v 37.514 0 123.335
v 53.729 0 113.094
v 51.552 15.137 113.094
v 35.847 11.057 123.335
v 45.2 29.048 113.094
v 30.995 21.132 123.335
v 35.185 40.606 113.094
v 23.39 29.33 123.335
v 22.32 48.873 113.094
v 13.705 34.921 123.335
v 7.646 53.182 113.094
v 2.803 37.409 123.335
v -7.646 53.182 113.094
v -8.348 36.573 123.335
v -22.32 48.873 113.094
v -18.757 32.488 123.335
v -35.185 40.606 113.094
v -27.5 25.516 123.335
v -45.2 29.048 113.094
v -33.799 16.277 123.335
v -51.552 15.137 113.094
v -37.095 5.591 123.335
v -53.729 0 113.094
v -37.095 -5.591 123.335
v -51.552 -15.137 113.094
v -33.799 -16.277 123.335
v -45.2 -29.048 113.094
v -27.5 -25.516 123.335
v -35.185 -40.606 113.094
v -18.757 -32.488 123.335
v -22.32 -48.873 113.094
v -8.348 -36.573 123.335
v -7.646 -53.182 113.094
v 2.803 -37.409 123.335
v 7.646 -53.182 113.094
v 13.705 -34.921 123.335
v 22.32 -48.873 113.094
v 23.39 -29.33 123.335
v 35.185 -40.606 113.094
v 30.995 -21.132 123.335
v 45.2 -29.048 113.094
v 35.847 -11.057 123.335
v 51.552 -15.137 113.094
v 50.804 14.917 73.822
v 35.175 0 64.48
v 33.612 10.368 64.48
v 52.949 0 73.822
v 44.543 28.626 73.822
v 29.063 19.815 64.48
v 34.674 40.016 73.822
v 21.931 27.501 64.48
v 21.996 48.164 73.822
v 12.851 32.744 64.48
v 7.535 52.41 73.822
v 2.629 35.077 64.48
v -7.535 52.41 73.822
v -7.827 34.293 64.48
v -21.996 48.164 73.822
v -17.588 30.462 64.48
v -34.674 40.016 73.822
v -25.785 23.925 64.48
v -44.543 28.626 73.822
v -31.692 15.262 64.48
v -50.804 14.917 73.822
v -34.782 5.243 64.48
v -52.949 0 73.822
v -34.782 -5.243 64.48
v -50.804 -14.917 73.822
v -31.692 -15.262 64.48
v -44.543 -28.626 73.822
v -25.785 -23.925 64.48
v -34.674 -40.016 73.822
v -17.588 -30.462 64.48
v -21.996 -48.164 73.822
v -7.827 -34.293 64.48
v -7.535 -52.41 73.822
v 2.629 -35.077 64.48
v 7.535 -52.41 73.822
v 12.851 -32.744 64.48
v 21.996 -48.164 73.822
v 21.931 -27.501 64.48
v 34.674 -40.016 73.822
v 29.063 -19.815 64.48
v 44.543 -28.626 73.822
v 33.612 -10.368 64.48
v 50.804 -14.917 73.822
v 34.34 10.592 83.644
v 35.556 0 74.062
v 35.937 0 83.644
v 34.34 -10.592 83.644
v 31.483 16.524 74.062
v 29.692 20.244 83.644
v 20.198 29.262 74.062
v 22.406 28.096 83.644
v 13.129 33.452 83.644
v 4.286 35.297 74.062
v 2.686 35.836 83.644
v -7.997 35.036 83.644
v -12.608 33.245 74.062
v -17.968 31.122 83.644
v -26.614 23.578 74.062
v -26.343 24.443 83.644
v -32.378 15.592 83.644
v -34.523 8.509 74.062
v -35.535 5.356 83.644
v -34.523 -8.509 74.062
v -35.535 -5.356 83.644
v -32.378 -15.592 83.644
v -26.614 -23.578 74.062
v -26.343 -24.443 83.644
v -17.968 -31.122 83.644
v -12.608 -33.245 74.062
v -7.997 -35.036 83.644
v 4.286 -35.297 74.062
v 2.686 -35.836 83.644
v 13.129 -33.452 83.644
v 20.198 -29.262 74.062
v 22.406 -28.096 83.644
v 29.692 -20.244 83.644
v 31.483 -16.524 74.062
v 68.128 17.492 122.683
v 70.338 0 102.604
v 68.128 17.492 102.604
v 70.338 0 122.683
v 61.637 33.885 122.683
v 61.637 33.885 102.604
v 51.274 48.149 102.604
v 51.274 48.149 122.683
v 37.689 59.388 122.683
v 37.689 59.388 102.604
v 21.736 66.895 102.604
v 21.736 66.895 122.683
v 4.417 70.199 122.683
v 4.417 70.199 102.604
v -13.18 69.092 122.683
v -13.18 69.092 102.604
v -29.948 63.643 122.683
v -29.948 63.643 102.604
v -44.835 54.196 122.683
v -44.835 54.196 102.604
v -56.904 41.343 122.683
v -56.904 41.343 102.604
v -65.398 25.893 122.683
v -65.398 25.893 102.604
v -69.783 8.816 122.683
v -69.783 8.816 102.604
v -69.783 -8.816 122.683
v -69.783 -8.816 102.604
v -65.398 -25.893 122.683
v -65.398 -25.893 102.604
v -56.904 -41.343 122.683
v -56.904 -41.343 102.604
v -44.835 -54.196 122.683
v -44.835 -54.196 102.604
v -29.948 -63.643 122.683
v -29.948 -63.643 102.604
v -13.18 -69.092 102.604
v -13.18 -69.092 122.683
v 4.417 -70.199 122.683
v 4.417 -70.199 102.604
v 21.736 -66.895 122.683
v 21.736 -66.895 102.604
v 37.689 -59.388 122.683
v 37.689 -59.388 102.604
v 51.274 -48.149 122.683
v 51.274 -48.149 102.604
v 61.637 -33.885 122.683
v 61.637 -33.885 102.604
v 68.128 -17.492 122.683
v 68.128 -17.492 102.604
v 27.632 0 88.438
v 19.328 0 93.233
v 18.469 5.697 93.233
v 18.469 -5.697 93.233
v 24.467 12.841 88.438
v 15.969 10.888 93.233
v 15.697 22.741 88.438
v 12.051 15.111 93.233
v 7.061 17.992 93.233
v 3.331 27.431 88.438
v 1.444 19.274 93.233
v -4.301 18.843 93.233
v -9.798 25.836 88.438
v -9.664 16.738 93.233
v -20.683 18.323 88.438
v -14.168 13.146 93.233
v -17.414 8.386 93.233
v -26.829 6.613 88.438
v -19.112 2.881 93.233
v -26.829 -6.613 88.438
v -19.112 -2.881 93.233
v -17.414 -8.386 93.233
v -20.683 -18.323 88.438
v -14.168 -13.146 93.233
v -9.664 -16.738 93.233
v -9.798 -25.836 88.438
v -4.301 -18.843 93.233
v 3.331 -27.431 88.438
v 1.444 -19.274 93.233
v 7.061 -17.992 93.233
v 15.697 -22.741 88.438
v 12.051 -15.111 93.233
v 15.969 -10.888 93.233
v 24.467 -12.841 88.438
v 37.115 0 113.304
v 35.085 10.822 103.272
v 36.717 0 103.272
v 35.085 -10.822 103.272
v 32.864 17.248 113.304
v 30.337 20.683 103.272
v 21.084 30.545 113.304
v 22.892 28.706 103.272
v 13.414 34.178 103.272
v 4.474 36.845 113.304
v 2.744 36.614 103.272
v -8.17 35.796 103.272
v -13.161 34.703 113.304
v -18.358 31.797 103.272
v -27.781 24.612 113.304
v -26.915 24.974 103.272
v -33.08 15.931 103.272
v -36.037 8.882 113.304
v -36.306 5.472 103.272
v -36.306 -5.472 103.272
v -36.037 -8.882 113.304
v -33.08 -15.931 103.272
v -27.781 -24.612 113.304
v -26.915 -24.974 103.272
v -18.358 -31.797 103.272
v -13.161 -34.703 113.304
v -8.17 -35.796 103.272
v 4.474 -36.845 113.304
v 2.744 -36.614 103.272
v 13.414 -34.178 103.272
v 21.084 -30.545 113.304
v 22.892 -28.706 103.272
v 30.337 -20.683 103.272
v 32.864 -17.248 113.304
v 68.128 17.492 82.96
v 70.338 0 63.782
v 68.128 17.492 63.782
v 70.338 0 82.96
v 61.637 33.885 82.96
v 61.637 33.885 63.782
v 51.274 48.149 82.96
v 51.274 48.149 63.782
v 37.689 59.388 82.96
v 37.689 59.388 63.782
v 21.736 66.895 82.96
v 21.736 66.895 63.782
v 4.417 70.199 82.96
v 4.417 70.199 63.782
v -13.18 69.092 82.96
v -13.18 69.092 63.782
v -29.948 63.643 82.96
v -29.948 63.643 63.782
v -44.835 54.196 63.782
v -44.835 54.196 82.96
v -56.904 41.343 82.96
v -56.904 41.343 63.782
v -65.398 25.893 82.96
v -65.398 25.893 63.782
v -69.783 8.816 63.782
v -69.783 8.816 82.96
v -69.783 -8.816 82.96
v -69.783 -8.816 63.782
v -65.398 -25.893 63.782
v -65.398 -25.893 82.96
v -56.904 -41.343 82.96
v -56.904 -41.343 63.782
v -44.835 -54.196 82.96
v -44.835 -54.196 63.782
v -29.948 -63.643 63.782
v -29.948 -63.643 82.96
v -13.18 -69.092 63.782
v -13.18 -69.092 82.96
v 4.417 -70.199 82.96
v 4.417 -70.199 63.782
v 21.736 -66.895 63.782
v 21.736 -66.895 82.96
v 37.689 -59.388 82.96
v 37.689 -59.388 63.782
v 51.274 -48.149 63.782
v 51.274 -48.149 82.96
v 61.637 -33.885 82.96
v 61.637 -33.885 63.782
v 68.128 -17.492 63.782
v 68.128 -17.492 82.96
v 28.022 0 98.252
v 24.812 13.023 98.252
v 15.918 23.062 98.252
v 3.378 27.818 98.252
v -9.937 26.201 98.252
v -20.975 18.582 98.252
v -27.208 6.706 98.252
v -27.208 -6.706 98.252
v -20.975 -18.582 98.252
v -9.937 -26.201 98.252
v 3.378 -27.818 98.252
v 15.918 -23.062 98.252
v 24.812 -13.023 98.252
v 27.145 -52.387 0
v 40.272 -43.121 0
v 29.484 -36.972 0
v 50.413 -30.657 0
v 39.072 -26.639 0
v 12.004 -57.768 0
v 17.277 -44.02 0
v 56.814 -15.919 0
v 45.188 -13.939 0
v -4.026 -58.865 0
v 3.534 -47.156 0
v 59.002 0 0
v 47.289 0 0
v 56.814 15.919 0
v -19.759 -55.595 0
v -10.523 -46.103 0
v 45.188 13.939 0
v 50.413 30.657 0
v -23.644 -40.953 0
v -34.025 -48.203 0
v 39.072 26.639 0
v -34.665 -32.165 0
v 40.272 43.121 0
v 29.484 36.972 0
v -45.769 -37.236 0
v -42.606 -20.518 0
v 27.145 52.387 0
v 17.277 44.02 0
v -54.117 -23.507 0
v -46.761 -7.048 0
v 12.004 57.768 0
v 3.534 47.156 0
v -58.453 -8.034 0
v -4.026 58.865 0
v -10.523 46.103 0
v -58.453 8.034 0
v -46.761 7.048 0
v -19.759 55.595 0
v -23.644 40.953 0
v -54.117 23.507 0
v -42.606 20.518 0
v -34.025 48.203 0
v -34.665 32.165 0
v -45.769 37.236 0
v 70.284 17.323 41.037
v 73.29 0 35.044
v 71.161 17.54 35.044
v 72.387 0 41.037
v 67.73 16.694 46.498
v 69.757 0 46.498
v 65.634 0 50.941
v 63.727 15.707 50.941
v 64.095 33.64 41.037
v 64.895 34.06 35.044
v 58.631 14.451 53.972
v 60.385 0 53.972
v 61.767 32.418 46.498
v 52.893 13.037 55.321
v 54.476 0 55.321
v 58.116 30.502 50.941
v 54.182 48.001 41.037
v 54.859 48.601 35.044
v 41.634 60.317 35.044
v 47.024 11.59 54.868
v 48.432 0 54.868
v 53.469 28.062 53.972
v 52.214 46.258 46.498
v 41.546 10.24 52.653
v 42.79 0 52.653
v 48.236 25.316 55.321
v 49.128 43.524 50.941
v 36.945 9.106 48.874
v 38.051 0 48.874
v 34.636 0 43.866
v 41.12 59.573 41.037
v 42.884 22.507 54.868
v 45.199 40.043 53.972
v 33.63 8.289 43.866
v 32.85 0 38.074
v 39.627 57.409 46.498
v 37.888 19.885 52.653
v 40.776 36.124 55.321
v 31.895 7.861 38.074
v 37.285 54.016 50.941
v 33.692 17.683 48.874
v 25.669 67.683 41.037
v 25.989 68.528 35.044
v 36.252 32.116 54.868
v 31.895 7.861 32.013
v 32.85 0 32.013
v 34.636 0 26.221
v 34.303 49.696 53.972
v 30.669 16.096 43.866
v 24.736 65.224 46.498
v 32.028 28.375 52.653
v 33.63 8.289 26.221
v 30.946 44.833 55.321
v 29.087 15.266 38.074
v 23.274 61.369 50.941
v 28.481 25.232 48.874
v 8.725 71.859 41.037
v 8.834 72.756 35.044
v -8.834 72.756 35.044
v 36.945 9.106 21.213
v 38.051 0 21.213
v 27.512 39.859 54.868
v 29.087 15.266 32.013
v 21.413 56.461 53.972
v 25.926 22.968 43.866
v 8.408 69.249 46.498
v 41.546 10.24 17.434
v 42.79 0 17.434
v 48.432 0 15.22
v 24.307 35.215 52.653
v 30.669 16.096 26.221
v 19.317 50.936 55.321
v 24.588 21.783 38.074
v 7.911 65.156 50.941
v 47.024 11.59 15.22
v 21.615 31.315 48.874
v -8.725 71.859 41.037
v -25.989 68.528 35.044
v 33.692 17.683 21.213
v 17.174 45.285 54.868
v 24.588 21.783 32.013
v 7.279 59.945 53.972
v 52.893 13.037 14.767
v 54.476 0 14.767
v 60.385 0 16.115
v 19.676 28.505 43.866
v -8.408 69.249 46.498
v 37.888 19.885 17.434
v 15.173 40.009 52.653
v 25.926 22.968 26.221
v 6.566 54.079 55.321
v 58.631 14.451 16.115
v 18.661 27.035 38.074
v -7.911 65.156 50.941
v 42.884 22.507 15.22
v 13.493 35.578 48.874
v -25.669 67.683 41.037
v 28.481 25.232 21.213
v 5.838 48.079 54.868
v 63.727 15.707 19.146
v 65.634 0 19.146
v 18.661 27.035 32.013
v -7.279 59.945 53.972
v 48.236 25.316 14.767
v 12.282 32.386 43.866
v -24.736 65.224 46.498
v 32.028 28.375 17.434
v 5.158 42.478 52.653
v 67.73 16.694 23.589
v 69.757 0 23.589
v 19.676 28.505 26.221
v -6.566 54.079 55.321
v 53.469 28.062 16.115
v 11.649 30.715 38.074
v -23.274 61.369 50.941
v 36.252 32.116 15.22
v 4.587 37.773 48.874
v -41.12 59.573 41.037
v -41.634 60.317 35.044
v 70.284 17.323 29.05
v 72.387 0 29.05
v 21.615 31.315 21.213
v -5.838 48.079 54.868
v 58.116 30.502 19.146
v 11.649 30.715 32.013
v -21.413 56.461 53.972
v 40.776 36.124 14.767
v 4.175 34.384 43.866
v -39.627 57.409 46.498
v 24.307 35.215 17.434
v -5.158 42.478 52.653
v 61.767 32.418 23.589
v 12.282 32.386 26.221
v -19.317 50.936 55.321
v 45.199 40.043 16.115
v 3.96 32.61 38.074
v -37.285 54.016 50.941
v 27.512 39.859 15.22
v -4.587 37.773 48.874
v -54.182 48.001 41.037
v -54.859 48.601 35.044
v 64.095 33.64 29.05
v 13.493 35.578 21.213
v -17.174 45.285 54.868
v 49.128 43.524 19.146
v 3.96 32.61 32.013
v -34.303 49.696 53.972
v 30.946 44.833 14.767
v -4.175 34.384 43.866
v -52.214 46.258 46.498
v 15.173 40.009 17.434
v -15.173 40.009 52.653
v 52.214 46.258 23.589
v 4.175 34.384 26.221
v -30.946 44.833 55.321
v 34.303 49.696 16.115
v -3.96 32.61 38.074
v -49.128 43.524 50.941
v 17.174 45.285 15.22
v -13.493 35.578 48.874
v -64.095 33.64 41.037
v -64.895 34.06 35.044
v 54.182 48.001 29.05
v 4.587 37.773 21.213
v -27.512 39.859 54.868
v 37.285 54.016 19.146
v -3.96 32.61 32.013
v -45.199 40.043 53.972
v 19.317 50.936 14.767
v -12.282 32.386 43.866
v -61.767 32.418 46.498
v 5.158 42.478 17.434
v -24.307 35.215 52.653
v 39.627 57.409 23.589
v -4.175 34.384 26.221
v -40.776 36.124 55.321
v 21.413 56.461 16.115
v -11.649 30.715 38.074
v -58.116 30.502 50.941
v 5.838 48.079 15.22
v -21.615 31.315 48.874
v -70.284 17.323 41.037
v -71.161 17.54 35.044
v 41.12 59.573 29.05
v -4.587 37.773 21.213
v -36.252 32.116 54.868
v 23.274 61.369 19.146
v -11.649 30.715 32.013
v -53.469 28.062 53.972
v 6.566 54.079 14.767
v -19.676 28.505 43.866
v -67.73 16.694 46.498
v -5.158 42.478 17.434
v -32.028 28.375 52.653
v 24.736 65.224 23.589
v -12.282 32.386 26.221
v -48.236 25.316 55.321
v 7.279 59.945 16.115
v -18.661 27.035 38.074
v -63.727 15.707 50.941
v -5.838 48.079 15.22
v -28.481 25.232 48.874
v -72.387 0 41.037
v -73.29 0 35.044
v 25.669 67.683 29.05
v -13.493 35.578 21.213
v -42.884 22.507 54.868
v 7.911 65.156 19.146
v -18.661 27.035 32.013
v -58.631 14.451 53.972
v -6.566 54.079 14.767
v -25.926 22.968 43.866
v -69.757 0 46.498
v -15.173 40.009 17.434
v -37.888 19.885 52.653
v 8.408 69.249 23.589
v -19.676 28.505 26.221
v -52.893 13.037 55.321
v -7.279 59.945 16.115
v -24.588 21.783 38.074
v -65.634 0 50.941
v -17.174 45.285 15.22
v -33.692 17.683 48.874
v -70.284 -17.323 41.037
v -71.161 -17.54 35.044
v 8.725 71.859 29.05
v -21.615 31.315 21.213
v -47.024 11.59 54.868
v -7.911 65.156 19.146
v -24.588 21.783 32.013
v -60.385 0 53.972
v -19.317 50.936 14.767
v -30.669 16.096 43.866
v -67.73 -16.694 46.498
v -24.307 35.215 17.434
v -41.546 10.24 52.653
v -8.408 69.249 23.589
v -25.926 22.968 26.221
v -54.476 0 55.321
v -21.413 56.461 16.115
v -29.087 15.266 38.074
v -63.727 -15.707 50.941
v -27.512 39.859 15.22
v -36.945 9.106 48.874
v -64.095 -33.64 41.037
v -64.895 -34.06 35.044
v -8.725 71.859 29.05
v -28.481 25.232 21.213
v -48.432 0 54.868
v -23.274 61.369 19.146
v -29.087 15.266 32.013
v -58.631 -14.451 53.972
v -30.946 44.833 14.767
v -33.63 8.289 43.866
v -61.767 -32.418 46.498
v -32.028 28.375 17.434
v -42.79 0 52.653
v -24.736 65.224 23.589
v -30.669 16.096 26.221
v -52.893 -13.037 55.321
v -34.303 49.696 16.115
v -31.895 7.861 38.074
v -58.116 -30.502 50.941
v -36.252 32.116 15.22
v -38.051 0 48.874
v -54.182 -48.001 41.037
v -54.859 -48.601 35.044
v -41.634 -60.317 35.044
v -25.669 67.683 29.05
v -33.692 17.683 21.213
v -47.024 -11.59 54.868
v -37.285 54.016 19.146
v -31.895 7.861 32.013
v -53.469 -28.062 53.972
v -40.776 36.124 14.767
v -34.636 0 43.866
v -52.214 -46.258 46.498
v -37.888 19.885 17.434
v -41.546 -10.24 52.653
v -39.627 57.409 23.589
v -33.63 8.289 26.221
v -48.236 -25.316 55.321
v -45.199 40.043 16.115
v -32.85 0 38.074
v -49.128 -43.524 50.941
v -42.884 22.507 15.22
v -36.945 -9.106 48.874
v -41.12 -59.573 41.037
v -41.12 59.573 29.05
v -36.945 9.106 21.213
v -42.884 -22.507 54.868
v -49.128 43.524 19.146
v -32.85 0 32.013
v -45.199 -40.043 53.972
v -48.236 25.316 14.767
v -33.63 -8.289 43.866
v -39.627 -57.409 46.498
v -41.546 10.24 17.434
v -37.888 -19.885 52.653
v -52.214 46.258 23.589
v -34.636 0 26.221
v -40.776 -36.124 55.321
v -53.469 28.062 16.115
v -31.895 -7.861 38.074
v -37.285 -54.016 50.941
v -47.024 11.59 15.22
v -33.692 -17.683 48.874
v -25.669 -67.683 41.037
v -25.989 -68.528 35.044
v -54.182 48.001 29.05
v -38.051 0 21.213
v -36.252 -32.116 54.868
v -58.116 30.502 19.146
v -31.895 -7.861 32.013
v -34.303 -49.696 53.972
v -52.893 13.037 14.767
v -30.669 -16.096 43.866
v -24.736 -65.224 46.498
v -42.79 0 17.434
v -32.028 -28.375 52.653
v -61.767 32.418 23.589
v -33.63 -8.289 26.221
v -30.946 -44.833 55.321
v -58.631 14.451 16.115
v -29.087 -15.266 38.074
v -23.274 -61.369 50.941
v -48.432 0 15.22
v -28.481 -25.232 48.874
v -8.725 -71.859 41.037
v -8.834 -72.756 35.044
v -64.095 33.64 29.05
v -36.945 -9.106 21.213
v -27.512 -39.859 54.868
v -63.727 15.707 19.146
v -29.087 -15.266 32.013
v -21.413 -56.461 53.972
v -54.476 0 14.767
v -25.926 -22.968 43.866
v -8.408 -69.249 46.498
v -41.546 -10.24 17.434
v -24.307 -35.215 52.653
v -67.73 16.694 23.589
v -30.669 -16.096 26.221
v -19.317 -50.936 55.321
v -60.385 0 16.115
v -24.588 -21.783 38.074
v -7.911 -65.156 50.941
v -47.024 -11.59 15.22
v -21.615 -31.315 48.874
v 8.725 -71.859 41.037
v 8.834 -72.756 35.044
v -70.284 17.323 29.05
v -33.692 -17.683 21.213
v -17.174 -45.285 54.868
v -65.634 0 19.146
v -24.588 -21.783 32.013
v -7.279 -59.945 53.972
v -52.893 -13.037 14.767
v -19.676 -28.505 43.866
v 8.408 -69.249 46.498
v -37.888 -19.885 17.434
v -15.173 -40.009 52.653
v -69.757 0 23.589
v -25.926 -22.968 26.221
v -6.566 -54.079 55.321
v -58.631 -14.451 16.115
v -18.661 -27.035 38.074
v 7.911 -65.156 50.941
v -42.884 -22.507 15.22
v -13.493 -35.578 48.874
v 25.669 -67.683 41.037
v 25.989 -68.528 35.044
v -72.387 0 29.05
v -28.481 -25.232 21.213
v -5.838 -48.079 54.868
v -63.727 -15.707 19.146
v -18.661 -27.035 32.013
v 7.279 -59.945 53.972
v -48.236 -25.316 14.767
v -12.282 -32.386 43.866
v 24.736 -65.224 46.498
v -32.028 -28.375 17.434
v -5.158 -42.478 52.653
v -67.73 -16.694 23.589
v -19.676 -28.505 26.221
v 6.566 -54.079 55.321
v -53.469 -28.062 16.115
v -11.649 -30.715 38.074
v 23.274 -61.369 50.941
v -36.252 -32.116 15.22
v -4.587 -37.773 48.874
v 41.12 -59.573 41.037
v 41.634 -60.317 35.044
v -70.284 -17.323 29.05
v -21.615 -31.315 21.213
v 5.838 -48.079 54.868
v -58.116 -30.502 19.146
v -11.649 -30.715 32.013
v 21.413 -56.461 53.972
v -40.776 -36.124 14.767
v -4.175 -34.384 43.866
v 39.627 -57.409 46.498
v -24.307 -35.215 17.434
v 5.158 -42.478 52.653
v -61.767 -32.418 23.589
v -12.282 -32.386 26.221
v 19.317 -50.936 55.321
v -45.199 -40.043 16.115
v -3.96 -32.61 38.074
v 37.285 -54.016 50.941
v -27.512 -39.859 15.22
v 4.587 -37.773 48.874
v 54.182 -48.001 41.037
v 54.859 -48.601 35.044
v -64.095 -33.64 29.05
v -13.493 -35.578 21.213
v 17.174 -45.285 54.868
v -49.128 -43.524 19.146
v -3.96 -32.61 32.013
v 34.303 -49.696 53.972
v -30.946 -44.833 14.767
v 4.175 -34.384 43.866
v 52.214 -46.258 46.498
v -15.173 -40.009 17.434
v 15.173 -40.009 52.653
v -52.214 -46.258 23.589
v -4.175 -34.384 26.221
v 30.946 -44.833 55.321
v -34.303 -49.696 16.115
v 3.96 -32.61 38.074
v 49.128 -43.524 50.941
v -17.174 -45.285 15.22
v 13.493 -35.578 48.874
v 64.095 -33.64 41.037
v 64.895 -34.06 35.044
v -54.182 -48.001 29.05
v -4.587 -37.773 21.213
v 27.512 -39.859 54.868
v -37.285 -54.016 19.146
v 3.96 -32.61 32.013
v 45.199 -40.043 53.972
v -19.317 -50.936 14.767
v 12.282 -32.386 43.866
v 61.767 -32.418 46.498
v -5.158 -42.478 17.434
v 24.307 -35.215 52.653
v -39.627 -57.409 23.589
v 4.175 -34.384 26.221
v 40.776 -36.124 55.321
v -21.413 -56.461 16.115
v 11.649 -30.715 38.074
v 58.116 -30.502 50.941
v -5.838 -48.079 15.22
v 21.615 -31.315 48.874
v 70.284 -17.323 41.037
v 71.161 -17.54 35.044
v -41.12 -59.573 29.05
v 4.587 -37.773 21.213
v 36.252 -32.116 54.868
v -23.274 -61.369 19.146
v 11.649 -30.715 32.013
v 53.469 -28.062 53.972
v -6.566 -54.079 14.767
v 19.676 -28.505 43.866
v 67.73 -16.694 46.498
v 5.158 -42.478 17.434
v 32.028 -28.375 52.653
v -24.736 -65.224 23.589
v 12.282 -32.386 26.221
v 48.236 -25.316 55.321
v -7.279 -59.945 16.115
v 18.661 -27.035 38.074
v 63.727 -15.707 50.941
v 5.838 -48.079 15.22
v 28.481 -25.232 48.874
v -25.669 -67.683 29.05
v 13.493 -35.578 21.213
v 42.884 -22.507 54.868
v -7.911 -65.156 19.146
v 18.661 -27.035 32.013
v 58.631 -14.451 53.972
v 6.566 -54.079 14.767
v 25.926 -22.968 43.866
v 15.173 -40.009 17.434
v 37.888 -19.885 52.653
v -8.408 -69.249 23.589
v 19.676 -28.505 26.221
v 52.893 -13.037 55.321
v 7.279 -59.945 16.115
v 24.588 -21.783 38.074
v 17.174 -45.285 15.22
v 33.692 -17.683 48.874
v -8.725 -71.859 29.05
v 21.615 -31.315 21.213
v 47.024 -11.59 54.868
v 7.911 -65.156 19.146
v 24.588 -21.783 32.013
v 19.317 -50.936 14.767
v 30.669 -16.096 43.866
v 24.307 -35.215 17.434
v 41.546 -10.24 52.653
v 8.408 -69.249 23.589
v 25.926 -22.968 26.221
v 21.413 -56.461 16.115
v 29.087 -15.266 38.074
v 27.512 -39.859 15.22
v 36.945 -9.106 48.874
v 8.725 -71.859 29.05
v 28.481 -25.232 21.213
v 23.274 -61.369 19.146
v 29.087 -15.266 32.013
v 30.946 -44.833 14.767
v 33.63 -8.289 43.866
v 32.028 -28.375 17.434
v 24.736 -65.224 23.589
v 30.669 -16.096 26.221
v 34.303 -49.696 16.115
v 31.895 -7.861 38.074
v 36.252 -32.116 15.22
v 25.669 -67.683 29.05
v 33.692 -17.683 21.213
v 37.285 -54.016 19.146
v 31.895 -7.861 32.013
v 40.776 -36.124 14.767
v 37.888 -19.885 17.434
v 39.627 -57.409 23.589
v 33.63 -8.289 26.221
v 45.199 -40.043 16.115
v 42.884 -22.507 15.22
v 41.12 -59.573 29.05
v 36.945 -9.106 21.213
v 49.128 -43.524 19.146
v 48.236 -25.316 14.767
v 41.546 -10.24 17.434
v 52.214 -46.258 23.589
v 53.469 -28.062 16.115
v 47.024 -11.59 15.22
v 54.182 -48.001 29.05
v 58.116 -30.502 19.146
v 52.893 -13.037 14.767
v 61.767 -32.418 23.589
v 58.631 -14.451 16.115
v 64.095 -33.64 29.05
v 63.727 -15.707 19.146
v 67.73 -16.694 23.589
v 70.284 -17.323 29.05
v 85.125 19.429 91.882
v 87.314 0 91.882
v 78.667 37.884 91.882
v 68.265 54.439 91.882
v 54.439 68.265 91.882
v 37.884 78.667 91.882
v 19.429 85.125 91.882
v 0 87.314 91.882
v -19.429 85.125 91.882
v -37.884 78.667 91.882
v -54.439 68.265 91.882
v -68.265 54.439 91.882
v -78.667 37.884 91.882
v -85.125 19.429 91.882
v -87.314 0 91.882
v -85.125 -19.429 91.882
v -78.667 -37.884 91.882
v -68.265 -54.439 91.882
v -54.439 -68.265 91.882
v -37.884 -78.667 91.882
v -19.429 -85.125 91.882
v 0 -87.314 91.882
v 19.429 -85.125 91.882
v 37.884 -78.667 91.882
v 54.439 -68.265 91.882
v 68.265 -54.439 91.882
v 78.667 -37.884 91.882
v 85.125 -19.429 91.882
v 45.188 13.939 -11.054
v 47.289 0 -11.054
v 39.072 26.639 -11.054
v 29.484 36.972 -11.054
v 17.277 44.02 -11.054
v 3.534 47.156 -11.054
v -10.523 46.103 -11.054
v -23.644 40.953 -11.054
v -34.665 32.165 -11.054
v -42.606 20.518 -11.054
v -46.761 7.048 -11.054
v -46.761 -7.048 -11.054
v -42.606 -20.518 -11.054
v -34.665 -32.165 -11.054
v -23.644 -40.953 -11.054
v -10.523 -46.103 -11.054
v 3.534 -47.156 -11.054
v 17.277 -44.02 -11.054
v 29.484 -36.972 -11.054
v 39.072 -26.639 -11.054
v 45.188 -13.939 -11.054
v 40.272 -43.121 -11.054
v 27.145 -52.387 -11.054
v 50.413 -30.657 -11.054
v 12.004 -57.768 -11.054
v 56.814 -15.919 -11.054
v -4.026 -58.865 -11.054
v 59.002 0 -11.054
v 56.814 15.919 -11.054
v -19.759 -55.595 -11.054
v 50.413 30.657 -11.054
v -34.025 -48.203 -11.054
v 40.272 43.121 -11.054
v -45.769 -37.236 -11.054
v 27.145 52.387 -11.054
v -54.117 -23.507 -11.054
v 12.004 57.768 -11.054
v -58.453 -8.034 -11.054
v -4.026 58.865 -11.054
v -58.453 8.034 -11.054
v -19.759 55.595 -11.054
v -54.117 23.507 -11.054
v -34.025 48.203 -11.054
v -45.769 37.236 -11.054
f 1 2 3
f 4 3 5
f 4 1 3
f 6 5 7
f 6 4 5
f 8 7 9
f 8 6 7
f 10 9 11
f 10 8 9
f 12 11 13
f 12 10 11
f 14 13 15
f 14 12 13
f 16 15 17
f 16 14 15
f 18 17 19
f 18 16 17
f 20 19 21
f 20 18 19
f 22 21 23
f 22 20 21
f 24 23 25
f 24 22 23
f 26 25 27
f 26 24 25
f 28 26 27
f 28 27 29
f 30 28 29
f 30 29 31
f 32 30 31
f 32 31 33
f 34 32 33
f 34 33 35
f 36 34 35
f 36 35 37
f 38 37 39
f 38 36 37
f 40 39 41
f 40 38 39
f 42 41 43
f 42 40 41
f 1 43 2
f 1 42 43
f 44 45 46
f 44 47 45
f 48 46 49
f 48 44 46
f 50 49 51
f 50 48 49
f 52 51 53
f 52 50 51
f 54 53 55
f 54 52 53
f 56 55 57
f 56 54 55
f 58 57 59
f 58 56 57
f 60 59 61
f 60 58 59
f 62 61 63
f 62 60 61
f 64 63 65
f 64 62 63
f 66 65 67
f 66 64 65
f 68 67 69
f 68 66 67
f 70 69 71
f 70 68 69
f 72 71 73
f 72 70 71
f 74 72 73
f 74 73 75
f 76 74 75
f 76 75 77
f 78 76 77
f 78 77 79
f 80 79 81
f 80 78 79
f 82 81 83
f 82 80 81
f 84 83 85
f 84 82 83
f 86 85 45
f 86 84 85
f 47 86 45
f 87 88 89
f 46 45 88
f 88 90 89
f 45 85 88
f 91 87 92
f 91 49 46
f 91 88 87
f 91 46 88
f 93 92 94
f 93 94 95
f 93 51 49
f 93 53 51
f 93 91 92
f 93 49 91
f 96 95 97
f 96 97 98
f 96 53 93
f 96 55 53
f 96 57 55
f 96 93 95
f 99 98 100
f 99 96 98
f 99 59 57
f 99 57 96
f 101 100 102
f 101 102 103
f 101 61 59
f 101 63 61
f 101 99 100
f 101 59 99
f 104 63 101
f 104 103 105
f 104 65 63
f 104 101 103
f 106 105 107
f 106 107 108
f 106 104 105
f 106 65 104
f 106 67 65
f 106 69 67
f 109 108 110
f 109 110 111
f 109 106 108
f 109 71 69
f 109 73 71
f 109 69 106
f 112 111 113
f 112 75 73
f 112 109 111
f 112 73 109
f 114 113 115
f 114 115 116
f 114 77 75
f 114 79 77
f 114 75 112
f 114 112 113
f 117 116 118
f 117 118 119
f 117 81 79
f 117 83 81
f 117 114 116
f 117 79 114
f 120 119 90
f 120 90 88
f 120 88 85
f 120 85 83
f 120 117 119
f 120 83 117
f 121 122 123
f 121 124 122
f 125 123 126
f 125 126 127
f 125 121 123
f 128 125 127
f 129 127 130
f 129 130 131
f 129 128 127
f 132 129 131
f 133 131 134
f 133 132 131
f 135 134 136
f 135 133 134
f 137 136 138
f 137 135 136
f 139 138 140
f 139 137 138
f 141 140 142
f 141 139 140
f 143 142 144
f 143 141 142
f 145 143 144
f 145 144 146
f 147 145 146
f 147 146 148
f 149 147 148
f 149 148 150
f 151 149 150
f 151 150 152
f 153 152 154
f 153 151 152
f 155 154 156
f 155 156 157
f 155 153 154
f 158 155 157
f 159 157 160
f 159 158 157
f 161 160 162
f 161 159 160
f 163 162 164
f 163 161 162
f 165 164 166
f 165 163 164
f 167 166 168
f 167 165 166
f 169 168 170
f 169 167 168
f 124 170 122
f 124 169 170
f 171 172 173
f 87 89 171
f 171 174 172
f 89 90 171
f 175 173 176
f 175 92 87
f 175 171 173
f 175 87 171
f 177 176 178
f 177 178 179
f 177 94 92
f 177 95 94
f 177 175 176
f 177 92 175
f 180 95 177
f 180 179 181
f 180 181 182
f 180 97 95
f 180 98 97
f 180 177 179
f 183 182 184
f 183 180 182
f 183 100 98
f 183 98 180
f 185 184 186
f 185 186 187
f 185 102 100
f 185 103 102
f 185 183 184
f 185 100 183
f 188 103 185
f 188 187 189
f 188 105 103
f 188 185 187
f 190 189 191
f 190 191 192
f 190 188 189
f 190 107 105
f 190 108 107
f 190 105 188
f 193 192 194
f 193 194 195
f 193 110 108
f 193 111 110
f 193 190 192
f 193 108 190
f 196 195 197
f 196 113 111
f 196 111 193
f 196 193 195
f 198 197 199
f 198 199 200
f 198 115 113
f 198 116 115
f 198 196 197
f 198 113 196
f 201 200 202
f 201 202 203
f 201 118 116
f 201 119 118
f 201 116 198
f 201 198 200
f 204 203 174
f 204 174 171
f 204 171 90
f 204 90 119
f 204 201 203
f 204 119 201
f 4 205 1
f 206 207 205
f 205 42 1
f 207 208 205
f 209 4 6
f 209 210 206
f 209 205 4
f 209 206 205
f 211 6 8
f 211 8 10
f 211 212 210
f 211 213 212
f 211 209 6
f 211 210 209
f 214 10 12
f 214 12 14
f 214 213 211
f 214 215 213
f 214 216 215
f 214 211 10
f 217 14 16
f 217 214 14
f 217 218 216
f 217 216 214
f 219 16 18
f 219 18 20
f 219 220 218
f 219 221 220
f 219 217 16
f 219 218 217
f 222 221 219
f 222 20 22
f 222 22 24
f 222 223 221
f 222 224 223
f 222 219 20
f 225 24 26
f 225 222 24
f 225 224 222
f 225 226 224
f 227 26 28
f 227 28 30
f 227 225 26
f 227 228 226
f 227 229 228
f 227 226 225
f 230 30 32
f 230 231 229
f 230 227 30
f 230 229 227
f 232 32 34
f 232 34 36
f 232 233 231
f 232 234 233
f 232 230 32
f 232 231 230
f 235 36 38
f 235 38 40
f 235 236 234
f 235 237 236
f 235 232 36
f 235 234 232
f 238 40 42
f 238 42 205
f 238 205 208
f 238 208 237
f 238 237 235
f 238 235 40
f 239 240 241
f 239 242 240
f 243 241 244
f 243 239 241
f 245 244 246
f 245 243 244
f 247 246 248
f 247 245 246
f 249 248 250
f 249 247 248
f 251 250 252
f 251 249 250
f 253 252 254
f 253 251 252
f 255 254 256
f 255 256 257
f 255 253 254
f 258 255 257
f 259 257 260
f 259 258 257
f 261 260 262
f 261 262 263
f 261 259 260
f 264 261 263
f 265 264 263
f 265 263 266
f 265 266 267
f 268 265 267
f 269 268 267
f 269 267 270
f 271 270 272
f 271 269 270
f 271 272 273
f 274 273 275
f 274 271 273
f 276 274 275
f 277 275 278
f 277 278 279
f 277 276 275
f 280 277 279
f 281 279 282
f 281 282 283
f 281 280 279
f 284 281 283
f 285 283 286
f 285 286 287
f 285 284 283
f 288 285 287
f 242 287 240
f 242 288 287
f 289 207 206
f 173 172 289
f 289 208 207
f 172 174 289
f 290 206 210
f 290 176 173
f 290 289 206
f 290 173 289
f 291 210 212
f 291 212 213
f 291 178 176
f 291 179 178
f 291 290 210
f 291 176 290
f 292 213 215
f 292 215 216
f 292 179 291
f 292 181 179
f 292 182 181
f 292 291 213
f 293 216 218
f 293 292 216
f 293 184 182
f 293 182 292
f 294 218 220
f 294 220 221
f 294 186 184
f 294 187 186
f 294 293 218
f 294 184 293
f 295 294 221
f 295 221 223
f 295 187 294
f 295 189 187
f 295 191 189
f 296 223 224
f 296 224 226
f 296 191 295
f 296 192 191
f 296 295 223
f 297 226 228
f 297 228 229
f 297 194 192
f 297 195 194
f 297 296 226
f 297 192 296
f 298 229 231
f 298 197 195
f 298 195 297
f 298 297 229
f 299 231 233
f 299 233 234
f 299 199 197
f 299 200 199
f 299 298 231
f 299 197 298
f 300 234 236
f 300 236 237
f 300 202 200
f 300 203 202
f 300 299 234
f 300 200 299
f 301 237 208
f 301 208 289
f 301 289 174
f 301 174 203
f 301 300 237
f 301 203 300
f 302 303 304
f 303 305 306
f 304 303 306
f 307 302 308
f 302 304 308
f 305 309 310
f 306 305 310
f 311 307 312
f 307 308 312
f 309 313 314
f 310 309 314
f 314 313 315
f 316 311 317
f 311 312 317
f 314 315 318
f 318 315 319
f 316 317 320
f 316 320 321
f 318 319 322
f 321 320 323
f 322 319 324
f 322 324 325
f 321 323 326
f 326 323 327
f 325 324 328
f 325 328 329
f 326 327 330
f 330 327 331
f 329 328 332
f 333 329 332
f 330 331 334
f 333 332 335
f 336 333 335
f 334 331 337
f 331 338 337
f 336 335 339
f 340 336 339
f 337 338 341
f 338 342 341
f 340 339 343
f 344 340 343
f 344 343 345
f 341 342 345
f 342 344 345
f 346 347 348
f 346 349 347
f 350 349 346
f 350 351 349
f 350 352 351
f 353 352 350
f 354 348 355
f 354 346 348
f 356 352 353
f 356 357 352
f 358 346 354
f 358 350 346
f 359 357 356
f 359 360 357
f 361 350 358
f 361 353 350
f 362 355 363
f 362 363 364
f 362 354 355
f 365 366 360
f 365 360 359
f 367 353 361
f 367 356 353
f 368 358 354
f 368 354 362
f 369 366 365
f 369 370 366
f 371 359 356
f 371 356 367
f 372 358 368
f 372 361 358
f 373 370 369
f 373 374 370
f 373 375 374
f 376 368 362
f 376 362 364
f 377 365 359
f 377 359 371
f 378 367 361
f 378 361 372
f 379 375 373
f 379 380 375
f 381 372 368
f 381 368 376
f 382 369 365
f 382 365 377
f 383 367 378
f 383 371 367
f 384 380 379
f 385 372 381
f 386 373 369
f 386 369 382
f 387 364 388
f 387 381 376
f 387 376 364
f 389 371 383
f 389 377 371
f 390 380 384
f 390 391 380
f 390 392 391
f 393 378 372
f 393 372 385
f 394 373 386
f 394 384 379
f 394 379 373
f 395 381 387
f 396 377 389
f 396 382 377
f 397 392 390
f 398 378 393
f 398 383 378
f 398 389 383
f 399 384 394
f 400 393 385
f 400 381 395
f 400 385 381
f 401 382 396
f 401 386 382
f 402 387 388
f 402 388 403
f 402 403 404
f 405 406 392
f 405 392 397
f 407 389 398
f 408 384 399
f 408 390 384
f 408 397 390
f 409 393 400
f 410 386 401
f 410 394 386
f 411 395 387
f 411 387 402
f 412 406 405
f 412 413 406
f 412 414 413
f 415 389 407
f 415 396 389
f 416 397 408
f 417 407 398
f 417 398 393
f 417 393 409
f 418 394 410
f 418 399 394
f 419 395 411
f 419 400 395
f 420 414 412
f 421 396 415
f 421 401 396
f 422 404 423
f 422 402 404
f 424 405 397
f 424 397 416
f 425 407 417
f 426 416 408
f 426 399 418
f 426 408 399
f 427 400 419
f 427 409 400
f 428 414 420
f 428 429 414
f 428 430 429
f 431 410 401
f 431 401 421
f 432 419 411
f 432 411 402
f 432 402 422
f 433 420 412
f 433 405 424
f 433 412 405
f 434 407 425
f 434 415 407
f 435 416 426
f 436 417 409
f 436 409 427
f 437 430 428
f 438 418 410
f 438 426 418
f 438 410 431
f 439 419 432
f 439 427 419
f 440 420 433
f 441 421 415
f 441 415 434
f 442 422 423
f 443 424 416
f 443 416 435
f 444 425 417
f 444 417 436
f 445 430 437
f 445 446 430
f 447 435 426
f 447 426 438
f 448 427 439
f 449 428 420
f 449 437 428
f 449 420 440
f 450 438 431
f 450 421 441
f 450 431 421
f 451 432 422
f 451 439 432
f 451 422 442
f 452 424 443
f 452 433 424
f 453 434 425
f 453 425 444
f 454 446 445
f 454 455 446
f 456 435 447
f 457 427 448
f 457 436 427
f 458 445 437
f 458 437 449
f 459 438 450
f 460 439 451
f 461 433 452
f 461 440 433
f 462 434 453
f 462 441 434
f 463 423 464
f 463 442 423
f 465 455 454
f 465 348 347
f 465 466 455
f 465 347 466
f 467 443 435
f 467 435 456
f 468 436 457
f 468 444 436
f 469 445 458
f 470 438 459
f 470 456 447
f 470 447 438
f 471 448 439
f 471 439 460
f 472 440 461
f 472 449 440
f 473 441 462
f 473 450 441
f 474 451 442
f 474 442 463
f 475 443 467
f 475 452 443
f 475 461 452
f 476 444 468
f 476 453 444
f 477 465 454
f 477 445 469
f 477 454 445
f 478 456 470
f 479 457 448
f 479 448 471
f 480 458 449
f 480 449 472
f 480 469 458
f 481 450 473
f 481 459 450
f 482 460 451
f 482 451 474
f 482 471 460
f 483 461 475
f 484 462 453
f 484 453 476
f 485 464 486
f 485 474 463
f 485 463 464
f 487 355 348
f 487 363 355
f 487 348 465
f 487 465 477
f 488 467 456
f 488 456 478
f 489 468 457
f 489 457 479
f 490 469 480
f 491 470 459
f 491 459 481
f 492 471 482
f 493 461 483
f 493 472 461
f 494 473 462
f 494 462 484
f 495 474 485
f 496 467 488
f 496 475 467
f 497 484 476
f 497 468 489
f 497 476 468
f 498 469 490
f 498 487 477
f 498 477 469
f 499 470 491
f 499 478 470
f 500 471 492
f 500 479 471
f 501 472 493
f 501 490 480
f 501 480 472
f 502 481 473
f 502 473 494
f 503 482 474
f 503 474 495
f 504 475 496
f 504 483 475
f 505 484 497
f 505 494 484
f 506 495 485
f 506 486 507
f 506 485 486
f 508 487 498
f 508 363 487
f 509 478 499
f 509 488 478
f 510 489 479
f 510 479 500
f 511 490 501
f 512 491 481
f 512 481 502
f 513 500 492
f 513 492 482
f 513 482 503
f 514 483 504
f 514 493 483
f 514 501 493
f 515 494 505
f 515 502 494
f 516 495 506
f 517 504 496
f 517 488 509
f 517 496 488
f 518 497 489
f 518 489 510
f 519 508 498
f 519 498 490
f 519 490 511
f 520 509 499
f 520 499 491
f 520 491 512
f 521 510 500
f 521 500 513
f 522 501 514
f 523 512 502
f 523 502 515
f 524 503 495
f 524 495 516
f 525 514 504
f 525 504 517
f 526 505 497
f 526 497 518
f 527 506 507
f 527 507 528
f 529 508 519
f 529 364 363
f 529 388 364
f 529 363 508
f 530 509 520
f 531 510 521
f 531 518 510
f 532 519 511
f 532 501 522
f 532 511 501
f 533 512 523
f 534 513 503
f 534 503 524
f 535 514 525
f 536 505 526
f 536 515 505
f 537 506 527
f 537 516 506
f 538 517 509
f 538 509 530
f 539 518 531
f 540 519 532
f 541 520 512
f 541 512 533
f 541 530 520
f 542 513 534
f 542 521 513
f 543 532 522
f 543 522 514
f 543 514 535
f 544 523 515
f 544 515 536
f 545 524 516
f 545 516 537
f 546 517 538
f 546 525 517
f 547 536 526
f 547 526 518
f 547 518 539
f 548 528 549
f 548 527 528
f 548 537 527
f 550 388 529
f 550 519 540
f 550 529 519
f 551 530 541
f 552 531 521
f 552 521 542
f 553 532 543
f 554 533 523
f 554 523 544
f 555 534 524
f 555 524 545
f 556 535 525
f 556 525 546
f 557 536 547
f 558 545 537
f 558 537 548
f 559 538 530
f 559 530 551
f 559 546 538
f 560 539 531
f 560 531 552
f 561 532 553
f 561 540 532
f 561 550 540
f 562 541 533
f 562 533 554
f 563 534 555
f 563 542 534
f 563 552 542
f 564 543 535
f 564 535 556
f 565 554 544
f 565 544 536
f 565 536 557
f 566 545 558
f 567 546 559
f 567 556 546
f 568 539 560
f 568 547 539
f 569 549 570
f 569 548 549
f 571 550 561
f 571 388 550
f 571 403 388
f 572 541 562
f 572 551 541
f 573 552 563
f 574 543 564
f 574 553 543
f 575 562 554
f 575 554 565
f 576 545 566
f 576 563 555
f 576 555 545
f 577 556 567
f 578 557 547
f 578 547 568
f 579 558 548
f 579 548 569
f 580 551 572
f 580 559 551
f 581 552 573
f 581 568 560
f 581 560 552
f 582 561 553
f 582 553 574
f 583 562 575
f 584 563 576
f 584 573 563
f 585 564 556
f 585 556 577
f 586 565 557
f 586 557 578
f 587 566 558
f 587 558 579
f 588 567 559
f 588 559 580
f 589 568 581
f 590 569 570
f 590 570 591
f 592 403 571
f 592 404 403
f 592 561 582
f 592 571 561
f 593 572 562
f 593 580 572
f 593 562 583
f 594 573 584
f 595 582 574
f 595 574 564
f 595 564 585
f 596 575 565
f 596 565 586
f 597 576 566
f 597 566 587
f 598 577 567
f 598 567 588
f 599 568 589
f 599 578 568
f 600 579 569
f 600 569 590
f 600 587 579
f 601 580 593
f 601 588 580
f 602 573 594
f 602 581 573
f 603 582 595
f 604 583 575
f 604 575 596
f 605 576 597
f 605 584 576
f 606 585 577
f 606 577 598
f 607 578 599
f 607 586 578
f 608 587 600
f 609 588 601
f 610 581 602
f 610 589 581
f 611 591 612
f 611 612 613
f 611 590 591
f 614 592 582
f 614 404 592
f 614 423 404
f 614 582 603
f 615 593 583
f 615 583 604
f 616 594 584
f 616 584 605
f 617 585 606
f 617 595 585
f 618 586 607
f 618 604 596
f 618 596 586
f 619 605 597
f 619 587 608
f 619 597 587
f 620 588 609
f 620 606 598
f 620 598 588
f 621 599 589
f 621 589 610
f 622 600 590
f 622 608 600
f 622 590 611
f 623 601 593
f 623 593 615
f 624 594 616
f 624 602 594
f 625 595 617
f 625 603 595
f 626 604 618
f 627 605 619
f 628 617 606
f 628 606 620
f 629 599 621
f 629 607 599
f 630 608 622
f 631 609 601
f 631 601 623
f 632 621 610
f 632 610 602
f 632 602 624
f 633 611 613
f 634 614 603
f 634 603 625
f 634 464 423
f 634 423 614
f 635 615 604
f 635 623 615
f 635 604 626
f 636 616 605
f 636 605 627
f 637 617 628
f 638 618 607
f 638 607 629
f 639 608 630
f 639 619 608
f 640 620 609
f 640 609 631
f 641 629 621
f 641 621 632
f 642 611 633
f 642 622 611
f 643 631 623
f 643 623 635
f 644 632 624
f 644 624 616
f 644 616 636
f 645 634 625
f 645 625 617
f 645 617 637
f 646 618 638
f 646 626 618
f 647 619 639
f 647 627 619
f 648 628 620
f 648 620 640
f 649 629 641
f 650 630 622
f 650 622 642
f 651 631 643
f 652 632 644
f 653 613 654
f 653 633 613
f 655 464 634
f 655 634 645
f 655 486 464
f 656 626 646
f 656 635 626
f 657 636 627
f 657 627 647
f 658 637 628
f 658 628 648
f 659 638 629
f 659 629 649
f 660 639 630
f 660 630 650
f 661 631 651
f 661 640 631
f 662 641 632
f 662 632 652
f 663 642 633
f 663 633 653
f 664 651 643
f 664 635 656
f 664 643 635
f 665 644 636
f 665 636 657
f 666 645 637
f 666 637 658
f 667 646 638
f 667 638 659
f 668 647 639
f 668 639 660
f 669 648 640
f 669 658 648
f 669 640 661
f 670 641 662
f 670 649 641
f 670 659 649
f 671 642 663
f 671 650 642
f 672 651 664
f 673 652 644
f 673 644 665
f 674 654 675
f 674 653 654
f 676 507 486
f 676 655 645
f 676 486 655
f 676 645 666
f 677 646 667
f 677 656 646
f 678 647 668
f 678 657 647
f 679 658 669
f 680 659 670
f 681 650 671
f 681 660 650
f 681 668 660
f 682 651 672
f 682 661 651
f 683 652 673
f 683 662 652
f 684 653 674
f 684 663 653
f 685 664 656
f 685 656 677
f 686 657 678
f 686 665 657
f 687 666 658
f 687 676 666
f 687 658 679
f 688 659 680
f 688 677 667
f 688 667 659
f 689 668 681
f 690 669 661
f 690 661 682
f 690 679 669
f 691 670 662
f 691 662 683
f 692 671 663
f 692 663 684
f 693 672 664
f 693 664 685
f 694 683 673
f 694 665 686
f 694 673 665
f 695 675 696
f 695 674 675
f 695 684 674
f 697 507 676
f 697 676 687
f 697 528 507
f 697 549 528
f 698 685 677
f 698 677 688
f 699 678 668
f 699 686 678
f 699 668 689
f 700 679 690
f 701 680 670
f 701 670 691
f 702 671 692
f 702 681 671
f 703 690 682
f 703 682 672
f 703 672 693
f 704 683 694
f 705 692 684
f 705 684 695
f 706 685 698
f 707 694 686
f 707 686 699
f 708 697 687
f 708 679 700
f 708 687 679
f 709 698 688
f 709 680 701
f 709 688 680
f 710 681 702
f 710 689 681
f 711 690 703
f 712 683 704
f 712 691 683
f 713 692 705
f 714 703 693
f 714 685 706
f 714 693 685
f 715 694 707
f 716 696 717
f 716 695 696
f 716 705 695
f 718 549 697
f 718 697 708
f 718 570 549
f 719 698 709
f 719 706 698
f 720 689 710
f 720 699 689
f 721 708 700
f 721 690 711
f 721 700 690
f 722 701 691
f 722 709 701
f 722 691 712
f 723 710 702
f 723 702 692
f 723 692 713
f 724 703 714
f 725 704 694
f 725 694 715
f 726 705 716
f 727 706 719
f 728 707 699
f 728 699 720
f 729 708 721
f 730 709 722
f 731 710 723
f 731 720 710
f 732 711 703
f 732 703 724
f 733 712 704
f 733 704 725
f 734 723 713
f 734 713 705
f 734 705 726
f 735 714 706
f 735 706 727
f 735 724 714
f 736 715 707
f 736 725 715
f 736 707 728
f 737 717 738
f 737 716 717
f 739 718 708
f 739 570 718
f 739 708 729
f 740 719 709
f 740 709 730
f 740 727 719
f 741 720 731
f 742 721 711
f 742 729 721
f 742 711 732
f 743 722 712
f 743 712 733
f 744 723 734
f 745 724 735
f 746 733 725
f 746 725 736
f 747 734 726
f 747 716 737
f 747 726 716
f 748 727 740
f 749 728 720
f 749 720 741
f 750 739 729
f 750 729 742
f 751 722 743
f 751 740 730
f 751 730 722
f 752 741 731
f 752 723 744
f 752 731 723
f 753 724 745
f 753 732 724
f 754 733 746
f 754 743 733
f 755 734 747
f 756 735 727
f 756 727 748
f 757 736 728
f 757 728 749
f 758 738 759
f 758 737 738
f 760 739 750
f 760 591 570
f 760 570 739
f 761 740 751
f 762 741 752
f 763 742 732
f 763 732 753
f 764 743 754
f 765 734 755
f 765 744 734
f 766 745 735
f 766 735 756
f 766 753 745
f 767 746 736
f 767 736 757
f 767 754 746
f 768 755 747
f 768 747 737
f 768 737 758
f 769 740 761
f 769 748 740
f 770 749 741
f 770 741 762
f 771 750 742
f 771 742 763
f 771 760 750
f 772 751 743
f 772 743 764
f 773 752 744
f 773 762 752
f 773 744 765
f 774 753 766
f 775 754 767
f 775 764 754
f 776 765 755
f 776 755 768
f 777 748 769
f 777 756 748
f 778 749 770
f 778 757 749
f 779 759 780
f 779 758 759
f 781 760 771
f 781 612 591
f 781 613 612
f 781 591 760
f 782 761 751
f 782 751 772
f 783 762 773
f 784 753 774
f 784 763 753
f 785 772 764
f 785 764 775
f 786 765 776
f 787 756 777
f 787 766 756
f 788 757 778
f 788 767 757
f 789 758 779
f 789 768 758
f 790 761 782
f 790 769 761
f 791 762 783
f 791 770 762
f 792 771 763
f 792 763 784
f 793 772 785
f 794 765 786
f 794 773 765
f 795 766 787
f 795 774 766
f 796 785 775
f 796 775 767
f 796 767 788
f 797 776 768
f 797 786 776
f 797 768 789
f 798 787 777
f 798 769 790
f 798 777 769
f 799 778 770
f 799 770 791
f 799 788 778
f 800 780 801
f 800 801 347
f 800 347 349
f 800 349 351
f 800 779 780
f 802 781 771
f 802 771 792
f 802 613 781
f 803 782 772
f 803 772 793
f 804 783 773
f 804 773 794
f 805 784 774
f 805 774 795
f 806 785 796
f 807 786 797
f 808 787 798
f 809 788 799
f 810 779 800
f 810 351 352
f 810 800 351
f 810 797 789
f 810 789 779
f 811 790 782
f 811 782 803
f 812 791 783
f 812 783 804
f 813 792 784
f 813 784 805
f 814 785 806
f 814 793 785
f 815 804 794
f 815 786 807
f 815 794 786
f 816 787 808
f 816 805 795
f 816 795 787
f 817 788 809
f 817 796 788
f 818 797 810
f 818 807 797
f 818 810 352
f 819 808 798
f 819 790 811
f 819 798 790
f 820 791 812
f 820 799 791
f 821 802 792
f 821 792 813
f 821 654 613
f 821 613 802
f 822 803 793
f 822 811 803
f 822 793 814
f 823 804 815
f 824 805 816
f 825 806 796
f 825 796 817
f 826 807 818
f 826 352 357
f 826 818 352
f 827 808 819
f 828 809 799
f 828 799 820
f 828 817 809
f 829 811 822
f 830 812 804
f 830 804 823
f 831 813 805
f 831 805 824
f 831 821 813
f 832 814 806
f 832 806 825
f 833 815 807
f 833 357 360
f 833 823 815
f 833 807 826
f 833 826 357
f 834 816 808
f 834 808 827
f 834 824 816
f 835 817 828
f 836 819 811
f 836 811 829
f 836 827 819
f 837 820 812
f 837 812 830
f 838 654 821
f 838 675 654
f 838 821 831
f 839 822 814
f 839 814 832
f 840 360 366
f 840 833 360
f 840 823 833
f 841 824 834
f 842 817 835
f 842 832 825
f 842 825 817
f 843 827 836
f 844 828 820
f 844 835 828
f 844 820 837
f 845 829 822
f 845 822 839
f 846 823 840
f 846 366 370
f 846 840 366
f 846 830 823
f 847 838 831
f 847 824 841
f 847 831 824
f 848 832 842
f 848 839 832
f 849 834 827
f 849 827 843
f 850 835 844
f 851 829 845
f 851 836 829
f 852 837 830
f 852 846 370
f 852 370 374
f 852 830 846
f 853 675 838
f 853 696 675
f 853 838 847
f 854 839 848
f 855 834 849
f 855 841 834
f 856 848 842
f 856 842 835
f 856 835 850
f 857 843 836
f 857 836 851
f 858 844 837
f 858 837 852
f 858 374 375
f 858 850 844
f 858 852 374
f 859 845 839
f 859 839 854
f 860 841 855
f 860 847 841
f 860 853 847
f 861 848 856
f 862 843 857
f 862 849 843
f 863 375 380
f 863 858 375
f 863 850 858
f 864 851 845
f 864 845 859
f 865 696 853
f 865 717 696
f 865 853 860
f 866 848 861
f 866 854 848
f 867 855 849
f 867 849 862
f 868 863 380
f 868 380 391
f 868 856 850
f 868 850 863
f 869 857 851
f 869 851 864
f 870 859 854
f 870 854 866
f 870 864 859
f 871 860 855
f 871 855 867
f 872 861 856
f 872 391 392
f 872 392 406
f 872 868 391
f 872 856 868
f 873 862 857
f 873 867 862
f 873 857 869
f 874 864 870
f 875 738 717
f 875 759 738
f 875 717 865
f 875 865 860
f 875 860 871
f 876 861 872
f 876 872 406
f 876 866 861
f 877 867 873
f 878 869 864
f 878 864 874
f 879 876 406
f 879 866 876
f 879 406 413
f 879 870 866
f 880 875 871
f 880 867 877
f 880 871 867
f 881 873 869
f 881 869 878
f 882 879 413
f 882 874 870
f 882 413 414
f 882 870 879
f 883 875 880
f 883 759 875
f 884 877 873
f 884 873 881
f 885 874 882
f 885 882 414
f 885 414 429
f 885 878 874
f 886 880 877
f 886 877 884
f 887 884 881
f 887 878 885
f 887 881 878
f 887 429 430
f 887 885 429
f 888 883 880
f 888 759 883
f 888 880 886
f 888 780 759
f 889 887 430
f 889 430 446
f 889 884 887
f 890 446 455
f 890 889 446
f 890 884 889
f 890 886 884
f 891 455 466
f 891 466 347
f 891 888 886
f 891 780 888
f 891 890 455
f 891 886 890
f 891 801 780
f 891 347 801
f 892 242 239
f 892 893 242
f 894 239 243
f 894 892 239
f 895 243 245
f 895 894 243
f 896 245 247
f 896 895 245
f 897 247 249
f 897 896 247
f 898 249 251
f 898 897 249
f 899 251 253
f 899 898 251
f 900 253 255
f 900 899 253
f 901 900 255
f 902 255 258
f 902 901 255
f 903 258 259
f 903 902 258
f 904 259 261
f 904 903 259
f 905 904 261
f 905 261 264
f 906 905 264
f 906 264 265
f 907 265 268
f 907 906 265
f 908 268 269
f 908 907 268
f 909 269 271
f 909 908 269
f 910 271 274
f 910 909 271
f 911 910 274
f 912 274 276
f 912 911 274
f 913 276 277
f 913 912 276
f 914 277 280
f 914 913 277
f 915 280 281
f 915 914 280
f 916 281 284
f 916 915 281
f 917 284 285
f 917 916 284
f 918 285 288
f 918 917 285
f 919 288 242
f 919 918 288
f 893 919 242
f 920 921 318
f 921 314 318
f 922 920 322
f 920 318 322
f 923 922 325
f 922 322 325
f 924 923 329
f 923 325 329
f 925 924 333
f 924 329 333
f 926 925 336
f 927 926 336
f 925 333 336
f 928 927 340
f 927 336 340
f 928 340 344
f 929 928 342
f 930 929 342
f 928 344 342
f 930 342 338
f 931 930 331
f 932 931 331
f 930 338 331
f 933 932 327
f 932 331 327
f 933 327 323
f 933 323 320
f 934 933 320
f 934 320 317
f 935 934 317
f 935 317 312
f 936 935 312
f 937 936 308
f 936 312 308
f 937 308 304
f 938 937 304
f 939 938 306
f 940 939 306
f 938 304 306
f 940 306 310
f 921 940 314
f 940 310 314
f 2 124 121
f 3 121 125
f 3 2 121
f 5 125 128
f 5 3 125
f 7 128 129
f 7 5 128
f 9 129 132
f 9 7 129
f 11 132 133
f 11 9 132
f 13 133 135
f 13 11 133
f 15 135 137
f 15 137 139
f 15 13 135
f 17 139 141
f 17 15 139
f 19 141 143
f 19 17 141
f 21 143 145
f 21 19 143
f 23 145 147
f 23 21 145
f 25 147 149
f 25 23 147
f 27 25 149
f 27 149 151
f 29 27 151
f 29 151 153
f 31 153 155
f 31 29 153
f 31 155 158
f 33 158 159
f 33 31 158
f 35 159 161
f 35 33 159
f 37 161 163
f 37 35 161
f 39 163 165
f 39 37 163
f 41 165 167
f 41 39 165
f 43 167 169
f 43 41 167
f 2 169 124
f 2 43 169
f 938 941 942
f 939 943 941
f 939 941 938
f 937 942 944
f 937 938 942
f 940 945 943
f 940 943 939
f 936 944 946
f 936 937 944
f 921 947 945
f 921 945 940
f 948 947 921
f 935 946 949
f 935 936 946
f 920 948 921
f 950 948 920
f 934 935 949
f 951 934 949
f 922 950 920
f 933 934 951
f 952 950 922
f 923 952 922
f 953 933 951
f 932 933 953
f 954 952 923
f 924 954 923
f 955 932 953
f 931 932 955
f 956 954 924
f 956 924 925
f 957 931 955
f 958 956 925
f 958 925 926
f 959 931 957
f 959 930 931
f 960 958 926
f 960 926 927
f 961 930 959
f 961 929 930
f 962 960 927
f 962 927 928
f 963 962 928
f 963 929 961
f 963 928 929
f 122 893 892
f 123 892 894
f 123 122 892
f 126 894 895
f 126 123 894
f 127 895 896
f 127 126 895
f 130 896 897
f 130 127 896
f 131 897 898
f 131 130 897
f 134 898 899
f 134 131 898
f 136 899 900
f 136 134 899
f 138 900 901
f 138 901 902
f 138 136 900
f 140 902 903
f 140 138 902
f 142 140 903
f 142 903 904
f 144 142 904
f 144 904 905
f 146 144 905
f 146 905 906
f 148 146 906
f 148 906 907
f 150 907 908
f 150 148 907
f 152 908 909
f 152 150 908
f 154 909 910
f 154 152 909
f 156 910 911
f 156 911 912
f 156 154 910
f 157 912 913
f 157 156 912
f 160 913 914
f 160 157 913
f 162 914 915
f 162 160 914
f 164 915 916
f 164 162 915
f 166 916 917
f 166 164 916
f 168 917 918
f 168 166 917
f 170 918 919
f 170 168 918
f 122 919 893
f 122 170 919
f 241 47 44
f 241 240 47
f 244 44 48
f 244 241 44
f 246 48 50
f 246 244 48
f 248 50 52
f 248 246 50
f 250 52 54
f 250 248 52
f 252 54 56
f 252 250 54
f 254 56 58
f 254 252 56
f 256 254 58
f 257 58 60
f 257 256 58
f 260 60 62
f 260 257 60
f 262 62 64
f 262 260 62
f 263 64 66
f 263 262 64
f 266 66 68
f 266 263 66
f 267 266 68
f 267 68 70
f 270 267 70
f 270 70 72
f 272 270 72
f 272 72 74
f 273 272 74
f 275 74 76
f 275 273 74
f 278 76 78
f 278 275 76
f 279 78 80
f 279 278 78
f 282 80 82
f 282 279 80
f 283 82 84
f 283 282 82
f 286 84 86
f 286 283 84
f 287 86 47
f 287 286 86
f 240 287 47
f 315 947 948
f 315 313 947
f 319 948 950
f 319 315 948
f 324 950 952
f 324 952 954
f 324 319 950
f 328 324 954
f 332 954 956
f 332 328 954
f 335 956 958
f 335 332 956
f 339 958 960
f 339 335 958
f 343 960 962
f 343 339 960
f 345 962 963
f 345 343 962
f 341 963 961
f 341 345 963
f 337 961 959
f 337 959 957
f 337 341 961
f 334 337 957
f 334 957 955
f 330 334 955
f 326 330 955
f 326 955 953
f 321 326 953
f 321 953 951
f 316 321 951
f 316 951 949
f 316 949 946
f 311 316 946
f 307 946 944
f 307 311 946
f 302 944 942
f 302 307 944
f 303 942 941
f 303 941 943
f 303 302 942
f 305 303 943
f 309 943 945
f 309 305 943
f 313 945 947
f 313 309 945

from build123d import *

# Parameters (mm, degrees)
F0_R     = 96.1929231716
F2_R     = 37.5334289589
F2_R_2   = 37.4396908016
F3_DEPTH = 215.9
F5_R     = 20.3338743876
F5_W     = 11.7133818567
F5_H     = 11.0542839393


with BuildPart() as f1:
    # F0 (on Front) → F1 (revolve)
    with BuildSketch(Plane.XZ):
        with Locations((113.3733838797, 138.1946206093)):
            Circle(F0_R)
    revolve(axis=Axis((0, 0, 82.1639001369), (0, 0, 1)))

    # F2 (on Front) → F3 (join)
    with BuildSketch(Plane.XZ):
        with Locations((165.6776368618, 54.8734031618)):
            Circle(F2_R)
        with Locations((-158.4630459547, 50.2354614437)):
            Circle(F2_R_2)
    extrude(amount=F3_DEPTH)


with BuildPart() as f6:
    # F5 (on Front) → F6 (revolve)
    with BuildSketch(Plane.XZ):
        with Locations((52.956495434, 35.0435636938)):
            Circle(F5_R)
    revolve(axis=Axis((0, 0, 35.6124825776), (0, 0, 1)))


with BuildPart() as f6b:
    # F5 (on Front) → F6, piece 2 (revolve)
    with BuildSketch(Plane.XZ):
        with Locations((53.1454179436, -5.5271419697)):
            Rectangle(F5_W, F5_H)
    revolve(axis=Axis((0, 0, 35.6124825776), (0, 0, 1)))


with BuildPart() as f6c:
    # F5 (on Front) → F6, piece 3 (revolve)
    with BuildSketch(Plane.XZ):
        Polygon((70.3376494348, 102.6043378538), (70.3376494348, 122.6832490881), (53.7288233056, 113.0941388515), align=None)
        Polygon((87.3141386506, 91.8823282351), (70.3376494348, 102.6043378538), (70.3376494348, 82.9602794553), align=None)
        Polygon((70.3376494348, 82.9602794553), (70.3376494348, 102.6043378538), (53.7288233056, 113.0941388515), (36.7165696991, 103.2721096523), (35.9365486191, 83.6435437985), (52.9488022255, 73.8215145992), align=None)
        Polygon((36.7165696991, 103.2721096523), (53.7288233056, 113.0941388515), (37.5138578006, 123.3351853895), align=None)
        Polygon((70.3376494348, 63.7820589821), (70.3376494348, 82.9602794553), (52.9488022255, 73.8215145992), align=None)
        Polygon((35.9365486191, 83.6435437985), (36.7165696991, 103.2721096523), (19.3277224898, 93.2326540351), align=None)
        Polygon((35.1750249082, 64.4804484807), (52.9488022255, 73.8215145992), (35.9365486191, 83.6435437985), align=None)
    revolve(axis=Axis((0, 0, 35.6124825776), (0, 0, 1)))


solid = Compound([f6.part, f6b.part, f6c.part])
